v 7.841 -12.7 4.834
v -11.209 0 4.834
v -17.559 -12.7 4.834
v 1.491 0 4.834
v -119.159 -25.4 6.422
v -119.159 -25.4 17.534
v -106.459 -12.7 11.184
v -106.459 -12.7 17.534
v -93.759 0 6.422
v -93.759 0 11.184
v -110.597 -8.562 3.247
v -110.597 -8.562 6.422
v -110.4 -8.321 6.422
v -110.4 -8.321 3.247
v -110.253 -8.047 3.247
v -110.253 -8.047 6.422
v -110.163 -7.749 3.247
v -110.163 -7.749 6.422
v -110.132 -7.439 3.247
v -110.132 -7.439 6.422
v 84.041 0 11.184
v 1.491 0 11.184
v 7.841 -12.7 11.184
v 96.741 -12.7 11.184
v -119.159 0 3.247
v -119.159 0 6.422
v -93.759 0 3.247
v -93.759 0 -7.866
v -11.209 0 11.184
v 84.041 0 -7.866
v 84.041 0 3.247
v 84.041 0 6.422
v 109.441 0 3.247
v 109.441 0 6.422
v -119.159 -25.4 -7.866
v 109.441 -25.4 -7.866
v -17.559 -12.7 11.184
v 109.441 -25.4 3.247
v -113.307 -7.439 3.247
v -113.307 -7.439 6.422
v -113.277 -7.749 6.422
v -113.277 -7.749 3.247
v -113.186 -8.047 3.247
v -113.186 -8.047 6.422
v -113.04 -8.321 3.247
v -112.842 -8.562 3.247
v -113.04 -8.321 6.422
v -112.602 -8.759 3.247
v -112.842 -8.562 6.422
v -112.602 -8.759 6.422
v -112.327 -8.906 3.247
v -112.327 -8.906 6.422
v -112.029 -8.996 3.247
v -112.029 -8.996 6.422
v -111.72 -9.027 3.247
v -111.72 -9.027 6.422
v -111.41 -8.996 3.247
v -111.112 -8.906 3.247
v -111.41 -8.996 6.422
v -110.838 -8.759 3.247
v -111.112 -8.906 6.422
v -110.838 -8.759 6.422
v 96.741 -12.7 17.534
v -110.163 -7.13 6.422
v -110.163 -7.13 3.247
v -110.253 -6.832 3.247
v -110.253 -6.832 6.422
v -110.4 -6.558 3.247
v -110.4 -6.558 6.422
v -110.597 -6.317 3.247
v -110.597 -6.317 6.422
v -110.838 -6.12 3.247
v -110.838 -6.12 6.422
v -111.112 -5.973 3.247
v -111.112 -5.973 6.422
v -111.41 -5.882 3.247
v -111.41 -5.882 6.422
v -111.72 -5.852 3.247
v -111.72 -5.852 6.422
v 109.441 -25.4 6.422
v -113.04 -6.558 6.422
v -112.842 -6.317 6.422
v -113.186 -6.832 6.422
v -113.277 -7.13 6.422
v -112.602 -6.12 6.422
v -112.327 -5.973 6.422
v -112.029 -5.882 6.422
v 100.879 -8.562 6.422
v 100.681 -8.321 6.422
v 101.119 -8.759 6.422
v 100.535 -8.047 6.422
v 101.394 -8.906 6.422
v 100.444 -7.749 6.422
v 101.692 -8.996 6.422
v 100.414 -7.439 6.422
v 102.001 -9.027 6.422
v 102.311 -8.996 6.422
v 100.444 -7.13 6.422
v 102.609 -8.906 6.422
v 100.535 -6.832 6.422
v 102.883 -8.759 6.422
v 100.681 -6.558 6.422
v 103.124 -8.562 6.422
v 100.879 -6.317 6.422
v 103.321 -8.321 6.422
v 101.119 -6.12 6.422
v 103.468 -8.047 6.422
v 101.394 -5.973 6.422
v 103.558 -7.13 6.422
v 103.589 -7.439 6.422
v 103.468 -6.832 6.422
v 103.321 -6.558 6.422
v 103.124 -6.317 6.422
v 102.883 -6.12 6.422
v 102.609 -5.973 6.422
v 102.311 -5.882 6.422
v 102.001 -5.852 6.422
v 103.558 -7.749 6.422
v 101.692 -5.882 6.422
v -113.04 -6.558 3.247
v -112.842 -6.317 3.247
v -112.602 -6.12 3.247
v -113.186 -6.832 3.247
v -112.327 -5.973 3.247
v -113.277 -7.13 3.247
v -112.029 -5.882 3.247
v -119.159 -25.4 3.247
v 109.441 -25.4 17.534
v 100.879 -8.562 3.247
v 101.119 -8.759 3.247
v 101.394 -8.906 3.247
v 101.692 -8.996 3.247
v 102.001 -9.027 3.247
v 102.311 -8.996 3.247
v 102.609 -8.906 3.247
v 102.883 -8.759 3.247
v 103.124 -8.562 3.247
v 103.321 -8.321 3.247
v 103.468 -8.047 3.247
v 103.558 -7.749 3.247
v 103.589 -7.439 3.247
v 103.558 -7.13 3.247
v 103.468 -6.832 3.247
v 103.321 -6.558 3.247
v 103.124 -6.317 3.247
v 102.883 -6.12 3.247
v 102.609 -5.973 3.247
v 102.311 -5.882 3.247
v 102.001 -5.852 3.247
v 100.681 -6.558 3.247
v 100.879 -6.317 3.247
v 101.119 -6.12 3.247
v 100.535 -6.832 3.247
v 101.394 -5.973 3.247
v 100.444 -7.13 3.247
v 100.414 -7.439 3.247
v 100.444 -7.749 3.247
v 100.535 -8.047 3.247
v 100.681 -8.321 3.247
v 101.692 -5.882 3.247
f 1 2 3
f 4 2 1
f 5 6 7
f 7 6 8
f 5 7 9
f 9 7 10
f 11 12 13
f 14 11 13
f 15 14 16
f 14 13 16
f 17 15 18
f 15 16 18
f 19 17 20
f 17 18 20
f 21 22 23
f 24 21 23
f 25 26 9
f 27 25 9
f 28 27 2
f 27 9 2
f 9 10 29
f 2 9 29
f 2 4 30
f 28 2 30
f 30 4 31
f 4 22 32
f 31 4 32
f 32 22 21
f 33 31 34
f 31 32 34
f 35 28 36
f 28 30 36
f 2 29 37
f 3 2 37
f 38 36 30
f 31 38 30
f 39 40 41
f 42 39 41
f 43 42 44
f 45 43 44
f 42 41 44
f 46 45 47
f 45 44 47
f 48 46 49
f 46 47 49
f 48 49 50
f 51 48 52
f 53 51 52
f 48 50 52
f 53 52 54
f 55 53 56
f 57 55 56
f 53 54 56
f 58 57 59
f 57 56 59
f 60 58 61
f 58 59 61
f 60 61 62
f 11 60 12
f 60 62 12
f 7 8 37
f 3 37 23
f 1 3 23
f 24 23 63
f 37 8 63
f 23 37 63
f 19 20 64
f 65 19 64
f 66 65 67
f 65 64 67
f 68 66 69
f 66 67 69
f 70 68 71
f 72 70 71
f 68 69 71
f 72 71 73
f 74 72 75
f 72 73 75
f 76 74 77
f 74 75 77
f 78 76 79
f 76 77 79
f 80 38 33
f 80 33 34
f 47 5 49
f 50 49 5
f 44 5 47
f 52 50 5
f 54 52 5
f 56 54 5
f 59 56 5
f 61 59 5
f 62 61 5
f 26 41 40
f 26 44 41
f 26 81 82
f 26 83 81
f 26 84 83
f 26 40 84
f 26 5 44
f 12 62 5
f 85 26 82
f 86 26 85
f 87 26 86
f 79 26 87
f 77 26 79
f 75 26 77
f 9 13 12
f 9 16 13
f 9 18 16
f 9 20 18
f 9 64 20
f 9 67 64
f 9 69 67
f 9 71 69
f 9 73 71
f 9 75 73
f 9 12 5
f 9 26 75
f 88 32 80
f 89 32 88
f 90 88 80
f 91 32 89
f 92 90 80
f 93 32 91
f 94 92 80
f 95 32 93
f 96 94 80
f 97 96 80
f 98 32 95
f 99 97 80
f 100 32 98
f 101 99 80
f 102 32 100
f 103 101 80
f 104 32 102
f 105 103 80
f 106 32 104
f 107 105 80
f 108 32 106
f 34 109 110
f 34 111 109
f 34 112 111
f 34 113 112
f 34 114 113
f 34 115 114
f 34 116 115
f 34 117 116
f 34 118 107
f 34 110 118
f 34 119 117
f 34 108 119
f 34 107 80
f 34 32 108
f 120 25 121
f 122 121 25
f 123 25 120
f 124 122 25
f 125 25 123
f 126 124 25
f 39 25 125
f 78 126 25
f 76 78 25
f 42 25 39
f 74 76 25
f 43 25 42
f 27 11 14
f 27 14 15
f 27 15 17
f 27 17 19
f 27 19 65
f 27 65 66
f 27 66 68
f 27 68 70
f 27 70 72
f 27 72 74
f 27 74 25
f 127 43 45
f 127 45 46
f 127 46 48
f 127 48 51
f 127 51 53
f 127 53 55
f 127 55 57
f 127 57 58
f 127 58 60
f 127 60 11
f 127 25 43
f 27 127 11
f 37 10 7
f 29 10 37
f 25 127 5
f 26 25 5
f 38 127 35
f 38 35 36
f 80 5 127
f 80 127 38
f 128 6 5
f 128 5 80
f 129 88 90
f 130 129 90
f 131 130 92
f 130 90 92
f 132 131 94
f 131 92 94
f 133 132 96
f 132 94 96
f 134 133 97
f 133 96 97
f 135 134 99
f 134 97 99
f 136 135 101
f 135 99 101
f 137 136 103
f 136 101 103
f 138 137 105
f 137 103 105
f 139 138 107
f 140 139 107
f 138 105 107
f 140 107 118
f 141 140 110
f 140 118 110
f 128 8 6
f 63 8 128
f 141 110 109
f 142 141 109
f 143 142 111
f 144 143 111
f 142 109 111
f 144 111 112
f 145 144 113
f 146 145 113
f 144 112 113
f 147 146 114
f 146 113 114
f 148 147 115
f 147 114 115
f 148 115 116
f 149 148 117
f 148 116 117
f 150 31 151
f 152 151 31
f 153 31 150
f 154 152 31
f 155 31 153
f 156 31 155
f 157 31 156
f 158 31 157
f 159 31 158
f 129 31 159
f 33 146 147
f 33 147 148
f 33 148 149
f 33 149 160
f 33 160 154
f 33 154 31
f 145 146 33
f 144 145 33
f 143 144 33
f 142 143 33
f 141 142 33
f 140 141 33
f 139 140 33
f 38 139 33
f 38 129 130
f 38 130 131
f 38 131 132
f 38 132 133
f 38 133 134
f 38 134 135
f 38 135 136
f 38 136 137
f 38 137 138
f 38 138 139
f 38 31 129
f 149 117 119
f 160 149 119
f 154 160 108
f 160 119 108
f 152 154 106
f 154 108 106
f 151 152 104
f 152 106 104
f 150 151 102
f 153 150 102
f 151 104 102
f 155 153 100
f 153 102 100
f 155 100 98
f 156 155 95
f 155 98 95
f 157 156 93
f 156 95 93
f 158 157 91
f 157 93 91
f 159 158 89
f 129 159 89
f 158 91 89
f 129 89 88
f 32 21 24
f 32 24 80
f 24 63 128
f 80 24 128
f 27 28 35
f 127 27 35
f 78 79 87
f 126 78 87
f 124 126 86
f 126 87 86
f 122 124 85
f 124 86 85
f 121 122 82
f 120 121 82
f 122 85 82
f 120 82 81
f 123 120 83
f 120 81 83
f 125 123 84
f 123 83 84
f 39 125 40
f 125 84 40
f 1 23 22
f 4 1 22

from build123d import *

# Parameters (mm, degrees)
F0_W      = 228.6
F0_H      = 25.4
F1_DEPTH  = 25.4
F3_DEPTH  = 11.1125
F5_DEPTH  = 11.1125
F6_DEPTH  = 6.35
F8_DEPTH  = 6.35
F11_DEPTH = 25.4


with BuildPart() as f1:
    # F0 (on Front) → F1 (new body)
    with BuildSketch(Plane.XZ):
        with Locations((-4.8591513187, 4.8340088824)):
            Rectangle(F0_W, F0_H)
    extrude(amount=F1_DEPTH)

    # F2 (on face) → F3 (cut)
    with BuildSketch(Plane.XY.offset(17.5340088824)):
        Polygon((-119.1591513187, 0), (-119.1591513187, -25.4), (-106.4591513187, -12.7), (-93.7591513187, 0), align=None)
        Polygon((96.7408486813, -12.7), (109.4408486813, -25.4), (109.4408486813, 0), (84.0408486813, 0), align=None)
    extrude(amount=-F3_DEPTH, mode=Mode.SUBTRACT)

    # F4 (on face) → F5 (cut)
    with BuildSketch(Plane(origin=(0, 0, -7.8659911176), x_dir=(1, 0, 0), z_dir=(0, 0, -1))):
        Polygon((-93.7591513187, 0), (-119.1591513187, 25.4), (-119.1591513187, 0), align=None)
        Polygon((109.4408486813, 0), (109.4408486813, 25.4), (84.0408486813, 0), align=None)
    extrude(amount=-F5_DEPTH, mode=Mode.SUBTRACT)

    # F2 (on face) → F6 (cut)
    with BuildSketch(Plane.XY.offset(17.5340088824)):
        Polygon((-93.7591513187, 0), (-106.4591513187, -12.7), (96.7408486813, -12.7), (84.0408486813, 0), align=None)
    extrude(amount=-F6_DEPTH, mode=Mode.SUBTRACT)

    # F7 (on face) → F8 (cut)
    with BuildSketch(Plane.XY.offset(11.1840088824)):
        Polygon((1.4908486813, 0), (-11.2091513187, 0), (-17.5591513187, -12.7), (7.8408486813, -12.7), align=None)
    extrude(amount=-F8_DEPTH, mode=Mode.SUBTRACT)

    # F9 (on face) + F10 (on face) → F11 (cut)
    with BuildSketch(Plane.XY.offset(6.4215088824)):
        with BuildLine():
            ThreePointArc((-110.5971315457, -8.562019773), (-110.2530048029, -8.0469977067), (-110.1321635608, -7.4394877579))
            ThreePointArc((-110.1321635608, -7.4394877579), (-110.5971315457, -6.3169557427), (-111.7196635608, -5.8519877579))
            Line((-111.7196635608, -5.8519877579), (-111.7196635608, -7.4394877579))
            Line((-111.7196635608, -7.4394877579), (-110.5971315457, -8.562019773))
        make_face()
        with BuildLine():
            Line((-111.7196635608, -7.4394877579), (-111.7196635608, -5.8519877579))
            ThreePointArc((-111.7196635608, -5.8519877579), (-112.8421955759, -6.3169557427), (-113.3071635608, -7.4394877579))
            Line((-113.3071635608, -7.4394877579), (-111.7196635608, -7.4394877579))
        make_face()
        with BuildLine():
            ThreePointArc((-113.3071635608, -7.4394877579), (-112.3271735097, -8.9061465157), (-110.5971315457, -8.562019773))
            Line((-110.5971315457, -8.562019773), (-111.7196635608, -7.4394877579))
            Line((-111.7196635608, -7.4394877579), (-113.3071635608, -7.4394877579))
        make_face()
    with BuildSketch(Plane.XY.offset(6.4215088824)):
        with BuildLine():
            Line((102.0013609235, -7.4394877579), (103.5888609235, -7.4394877579))
            ThreePointArc((103.5888609235, -7.4394877579), (103.1238929386, -6.3169557427), (102.0013609235, -5.8519877579))
            Line((102.0013609235, -5.8519877579), (102.0013609235, -7.4394877579))
        make_face()
        with BuildLine():
            Line((102.0013609235, -7.4394877579), (102.0013609235, -5.8519877579))
            ThreePointArc((102.0013609235, -5.8519877579), (100.5347021656, -6.831977809), (100.8788289083, -8.562019773))
            Line((100.8788289083, -8.562019773), (102.0013609235, -7.4394877579))
        make_face()
        with BuildLine():
            ThreePointArc((100.8788289083, -8.562019773), (102.6088708723, -8.9061465157), (103.5888609235, -7.4394877579))
            Line((103.5888609235, -7.4394877579), (102.0013609235, -7.4394877579))
            Line((102.0013609235, -7.4394877579), (100.8788289083, -8.562019773))
        make_face()
    extrude(amount=-F11_DEPTH, mode=Mode.SUBTRACT)


solid = f1.part
